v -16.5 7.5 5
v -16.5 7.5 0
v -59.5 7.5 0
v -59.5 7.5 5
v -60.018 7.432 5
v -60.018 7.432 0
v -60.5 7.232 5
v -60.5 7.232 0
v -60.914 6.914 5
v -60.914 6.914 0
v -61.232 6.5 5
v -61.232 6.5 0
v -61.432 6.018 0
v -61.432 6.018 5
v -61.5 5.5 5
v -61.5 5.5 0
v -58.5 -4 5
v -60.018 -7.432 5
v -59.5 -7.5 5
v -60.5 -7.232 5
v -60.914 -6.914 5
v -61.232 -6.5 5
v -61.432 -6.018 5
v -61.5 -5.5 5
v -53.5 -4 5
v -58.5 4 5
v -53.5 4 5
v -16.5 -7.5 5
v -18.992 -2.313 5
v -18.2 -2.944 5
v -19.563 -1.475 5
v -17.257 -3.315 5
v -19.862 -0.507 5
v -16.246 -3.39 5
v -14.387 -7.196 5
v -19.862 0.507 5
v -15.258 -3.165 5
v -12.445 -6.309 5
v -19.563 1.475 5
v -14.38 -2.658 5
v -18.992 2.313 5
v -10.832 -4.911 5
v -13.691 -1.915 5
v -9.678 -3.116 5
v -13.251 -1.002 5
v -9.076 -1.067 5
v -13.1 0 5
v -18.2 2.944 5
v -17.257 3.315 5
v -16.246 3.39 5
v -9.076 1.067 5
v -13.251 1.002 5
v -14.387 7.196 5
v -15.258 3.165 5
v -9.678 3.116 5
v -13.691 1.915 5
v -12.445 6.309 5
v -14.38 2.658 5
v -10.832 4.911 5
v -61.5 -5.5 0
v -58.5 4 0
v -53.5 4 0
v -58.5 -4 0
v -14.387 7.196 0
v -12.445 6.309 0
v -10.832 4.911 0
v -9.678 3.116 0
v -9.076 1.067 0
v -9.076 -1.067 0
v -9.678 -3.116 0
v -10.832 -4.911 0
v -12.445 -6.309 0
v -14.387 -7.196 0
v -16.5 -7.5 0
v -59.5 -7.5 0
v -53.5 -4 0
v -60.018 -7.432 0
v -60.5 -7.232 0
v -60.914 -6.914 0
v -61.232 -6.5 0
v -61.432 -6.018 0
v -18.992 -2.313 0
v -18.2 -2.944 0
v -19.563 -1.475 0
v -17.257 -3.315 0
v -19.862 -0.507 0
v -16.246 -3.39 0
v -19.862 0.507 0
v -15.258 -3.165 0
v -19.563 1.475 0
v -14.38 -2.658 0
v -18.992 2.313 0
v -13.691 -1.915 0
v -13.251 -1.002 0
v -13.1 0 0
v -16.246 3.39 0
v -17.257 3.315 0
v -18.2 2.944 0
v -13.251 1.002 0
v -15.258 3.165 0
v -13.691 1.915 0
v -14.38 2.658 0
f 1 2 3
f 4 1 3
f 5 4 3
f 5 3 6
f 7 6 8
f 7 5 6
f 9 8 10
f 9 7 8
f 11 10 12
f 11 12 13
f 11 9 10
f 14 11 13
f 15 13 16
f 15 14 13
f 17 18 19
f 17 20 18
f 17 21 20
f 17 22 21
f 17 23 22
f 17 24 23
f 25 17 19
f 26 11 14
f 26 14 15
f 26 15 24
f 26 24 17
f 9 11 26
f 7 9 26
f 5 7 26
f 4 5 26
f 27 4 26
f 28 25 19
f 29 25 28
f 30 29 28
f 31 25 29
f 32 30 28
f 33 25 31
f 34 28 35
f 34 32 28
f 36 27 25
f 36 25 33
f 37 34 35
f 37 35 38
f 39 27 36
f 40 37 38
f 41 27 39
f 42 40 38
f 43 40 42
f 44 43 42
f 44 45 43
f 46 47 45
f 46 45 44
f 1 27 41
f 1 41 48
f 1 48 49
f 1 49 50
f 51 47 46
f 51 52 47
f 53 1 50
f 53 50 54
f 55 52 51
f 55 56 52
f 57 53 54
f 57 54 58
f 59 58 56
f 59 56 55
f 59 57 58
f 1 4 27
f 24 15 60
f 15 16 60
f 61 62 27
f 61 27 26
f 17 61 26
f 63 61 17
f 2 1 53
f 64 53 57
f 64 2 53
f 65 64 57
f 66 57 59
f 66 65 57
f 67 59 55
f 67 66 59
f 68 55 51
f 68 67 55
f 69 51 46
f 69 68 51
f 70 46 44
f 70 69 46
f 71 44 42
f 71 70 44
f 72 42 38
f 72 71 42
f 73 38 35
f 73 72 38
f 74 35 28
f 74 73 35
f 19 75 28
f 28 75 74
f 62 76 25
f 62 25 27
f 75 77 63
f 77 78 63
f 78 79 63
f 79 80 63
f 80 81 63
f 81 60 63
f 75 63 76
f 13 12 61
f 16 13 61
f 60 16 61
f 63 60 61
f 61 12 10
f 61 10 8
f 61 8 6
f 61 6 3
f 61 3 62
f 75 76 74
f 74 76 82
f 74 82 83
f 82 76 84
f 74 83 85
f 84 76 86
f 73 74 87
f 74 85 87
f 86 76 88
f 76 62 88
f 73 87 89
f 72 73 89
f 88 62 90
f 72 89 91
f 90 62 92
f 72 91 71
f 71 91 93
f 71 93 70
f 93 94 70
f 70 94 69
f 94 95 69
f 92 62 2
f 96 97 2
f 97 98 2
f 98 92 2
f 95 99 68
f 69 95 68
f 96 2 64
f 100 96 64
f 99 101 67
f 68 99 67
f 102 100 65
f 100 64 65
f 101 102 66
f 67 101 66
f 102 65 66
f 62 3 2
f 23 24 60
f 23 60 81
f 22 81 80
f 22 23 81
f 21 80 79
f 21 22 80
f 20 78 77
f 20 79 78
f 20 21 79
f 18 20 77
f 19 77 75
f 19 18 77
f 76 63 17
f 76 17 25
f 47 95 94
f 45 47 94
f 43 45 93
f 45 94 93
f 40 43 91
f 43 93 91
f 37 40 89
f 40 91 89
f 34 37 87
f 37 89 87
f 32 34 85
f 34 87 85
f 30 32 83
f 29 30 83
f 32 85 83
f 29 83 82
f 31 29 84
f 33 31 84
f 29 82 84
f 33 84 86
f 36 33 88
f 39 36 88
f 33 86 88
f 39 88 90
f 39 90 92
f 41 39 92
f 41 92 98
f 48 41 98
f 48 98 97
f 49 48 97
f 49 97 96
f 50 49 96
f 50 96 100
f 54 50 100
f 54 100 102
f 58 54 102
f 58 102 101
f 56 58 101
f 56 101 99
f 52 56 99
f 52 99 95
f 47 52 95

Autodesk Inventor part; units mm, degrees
ref_plane "YZ Plane" through (0, 0, 0) normal (1, 0, 0) x (0, 1, 0)
ref_plane "XZ Plane" through (0, 0, 0) normal (0, 1, 0) x (-1, 0, 0)
ref_plane "XY Plane" through (0, 0, 0) normal (0, 0, 1) x (1, 0, 0)
sketch "Skizze1" plane through (0, 0, 0) normal (0, 0, 1) x (1, 0, 0)
  line L0 (0, -24.15) -> (0, 24.15) projected
  line L1 (-77.25, 0) -> (33, 0) projected
  circle A0 centre (-15.5, 15.5) radius 1.75
  circle A1 centre (15.5, 15.5) radius 1.75
  circle A2 centre (-15.5, -15.5) radius 1.75
  circle A3 centre (15.5, -15.5) radius 1.75
  circle A4 centre (-16.5, 0) radius 11
  circle A5 centre (0, 0) radius 5.5
  circle A6 centre (-16.5, 0) radius 3.4
  arc A7 (-16.5, -7.5) -> (-16.5, 7.5) centre (-16.5, 0) ccw
  line L2 (-16.5, 7.5) -> (-36.5, 7.5)
  line L3 (-36.5, 7.5) -> (-61.5, 7.5)
  line L4 (-61.5, 7.5) -> (-61.5, -7.5)
  line L5 (-61.5, -7.5) -> (-16.5, -7.5)
  dimension "d0" = 3.5
  dimension "d1" = 15.5
  dimension "d2" = 15.5
  dimension "d3" = 22
  dimension "d4" = 16.5
  dimension "d5" = 11
  dimension "d6" = 6.8
  dimension "d7" = 15
  dimension "d10" = 15
  dimension "d11" = 45
extrude "Extrusion1" add sketch "Skizze1" along normal blind 5 contours A7 L5 A4 L1 A6 | L1 A6 A4 L2 A7 | A4 L1 L4 L3 L2 | L5 L4 L1 A4
sketch "Skizze3" plane through (0, 0, 0) normal (0, 0, -1) x (-1, 0, 0)
  circle A0 centre (16.5, 0) radius 3.4 projected
  arc A1 (16.5, 7.5) -> (16.5, -7.5) centre (16.5, 0) ccw projected
  line L0 (16.5, -7.5) -> (61.5, -7.5) projected
  line L1 (61.5, -7.5) -> (61.5, 7.5) projected
  line L2 (61.5, 7.5) -> (16.5, 7.5) projected
  line L3 (58.5, -4) -> (53.5, -4)
  line L4 (53.5, -4) -> (53.5, 4)
  line L5 (53.5, 4) -> (58.5, 4)
  line L6 (58.5, 4) -> (58.5, -4)
  line L7 (73.8, 0) -> (-12.3, 0) projected
  point P0 (0, 0)
  dimension "d17" = 5
  dimension "d18" = 8
  dimension "d19" = 3
extrude "Extrusion3" cut sketch "Skizze3" against normal blind 5 contours L7 L6 L3 L4 | L4 L5 L6 L7
fillet "Rundung1" radius 2 2 edges at (-61.5, 7.5, 2.5) (-61.5, -7.5, 2.5)
properties part number "Kugellager-Schieber-Seite_M8Gewinde" material "ABS-Kunststoff"
